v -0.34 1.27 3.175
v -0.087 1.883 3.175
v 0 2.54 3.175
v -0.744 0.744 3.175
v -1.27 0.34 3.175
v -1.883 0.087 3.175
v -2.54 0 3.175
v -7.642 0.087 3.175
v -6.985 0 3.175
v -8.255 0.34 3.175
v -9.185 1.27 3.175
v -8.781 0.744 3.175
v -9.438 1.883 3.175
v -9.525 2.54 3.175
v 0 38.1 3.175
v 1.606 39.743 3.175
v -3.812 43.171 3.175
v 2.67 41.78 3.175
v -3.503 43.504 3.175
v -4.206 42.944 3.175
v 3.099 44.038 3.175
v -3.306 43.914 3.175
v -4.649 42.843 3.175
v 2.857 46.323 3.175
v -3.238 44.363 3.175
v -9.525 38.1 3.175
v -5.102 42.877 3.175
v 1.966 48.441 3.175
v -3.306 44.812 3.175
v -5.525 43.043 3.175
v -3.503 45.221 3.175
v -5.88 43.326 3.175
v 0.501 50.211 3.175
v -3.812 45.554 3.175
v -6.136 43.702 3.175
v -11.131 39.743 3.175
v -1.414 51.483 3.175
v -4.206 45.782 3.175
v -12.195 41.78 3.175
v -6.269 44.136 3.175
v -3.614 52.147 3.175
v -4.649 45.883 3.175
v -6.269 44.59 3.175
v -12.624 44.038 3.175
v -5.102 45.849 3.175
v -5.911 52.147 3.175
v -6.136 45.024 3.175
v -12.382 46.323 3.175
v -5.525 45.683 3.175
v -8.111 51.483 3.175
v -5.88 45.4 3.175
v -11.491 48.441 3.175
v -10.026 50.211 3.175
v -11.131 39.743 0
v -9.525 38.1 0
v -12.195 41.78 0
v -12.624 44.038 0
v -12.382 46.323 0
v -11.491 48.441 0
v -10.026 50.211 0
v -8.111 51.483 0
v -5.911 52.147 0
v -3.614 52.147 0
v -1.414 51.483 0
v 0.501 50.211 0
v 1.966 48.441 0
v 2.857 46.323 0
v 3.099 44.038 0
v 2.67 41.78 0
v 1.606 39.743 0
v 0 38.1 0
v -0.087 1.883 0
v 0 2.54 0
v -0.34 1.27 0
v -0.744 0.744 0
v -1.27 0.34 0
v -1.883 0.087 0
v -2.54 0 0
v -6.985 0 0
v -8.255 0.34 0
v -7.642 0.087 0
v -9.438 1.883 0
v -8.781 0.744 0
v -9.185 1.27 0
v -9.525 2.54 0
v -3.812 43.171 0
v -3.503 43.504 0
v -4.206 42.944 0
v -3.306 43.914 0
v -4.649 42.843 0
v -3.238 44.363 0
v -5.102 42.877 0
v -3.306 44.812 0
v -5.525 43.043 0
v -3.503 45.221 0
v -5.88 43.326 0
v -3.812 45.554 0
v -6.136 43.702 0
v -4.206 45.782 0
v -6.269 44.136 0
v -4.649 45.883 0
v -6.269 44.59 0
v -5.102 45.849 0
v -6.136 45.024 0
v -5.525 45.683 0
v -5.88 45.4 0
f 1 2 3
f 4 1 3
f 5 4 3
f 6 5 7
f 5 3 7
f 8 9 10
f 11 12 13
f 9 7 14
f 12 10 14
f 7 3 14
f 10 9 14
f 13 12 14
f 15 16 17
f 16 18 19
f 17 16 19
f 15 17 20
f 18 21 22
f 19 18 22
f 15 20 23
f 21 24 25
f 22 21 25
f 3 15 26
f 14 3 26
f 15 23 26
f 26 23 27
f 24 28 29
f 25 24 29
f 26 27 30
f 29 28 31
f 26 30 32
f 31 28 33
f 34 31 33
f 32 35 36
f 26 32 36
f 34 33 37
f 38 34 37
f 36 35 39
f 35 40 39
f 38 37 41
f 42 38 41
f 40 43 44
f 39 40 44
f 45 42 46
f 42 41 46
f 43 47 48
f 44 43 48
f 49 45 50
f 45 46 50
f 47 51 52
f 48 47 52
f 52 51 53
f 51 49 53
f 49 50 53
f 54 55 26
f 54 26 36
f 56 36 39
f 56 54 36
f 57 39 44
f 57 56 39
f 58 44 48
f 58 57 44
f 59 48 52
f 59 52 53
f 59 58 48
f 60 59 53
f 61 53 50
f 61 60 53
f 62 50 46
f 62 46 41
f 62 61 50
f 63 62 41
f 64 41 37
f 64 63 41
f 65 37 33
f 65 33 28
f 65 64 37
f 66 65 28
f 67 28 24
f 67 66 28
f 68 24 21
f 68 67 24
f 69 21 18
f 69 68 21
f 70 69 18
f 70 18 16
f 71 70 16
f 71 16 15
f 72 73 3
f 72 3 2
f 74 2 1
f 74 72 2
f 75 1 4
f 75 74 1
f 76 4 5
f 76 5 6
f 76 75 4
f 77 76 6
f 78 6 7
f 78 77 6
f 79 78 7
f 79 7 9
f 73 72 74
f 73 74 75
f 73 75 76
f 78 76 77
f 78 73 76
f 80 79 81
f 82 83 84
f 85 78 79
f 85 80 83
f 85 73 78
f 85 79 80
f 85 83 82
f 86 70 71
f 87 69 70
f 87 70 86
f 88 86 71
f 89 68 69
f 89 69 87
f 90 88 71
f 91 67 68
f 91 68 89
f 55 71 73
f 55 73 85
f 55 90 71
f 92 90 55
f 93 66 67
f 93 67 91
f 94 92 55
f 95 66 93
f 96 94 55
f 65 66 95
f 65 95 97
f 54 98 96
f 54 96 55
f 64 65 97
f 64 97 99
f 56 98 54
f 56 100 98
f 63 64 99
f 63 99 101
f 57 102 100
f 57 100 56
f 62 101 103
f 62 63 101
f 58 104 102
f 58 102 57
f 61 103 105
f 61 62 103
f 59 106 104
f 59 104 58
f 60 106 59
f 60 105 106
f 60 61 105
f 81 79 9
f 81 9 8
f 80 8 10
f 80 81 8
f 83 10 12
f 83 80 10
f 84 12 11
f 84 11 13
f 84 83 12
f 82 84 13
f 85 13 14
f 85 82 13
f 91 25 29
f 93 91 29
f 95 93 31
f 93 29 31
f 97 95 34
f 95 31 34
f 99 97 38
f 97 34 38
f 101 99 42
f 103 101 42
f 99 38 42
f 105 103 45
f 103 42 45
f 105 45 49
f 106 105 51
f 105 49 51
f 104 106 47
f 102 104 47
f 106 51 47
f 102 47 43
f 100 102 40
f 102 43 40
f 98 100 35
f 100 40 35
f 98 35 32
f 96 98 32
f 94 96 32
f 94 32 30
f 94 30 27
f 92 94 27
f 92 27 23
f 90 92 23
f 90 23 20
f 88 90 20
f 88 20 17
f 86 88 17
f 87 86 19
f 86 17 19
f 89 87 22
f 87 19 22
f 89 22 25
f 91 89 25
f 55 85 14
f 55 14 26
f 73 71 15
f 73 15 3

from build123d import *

# Parameters (mm, degrees)
BOSS_EXTRUDE1_DEPTH = 3.175
SKETCH2_R           = 1.524
CUT_EXTRUDE1_DEPTH  = 3.175


with BuildPart() as part:
    # Sketch1 → Boss-Extrude1 (new body)
    with BuildSketch(Plane.XY):
        with BuildLine():
            Line((-2.54, 0), (-6.985, 0))
            ThreePointArc((-6.985, 0), (-8.781051224, 0.743948776), (-9.525, 2.54))
            Line((-9.525, 2.54), (-9.525, 38.1))
            ThreePointArc((-9.525, 38.1), (-4.7625, 52.231044912), (0, 38.1))
            Line((0, 38.1), (0, 2.54))
            ThreePointArc((0, 2.54), (-0.743948776, 0.743948776), (-2.54, 0))
        make_face()
    extrude(amount=BOSS_EXTRUDE1_DEPTH)

    # Sketch2 → Cut-Extrude1 (cut)
    with BuildSketch(Plane.XY.offset(3.175)):
        with Locations((-4.7625, 44.362984272)):
            Circle(SKETCH2_R)
    extrude(amount=-CUT_EXTRUDE1_DEPTH, mode=Mode.SUBTRACT)


solid = part.part
